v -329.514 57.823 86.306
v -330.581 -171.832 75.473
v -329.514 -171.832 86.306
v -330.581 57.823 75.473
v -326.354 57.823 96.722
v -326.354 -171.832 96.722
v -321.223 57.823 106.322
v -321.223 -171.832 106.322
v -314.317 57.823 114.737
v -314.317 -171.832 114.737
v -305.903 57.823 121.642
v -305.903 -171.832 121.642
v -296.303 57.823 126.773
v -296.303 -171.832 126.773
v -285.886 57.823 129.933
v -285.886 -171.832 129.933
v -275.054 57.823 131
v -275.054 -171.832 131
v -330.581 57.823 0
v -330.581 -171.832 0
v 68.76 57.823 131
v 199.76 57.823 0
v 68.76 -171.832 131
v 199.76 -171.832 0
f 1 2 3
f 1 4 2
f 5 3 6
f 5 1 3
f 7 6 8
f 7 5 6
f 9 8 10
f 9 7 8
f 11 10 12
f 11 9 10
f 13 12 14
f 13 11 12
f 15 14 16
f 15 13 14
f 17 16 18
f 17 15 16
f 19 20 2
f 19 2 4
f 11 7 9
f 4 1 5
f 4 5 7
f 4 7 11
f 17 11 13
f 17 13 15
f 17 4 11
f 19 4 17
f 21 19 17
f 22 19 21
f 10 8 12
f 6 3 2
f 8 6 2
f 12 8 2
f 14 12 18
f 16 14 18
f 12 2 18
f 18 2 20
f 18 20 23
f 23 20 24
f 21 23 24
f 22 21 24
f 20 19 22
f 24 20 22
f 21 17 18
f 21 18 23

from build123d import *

# Parameters (mm, degrees)
F0_W        = 599.3404984474
F0_H        = 229.6551764011
F1_DEPTH    = 131
F2_R        = 55.5269119346
F3_T1_DEPTH = 1258.3283715875


# Not quite as in the source:
# - a fillet or chamfer that OpenCascade refuses, or shapes differently, is made with other operations: its cross-section is extruded or revolved along the edge and cut away or added


with BuildPart() as f1:
    # F0 (on Top) → F1 (new body)
    with BuildSketch(Plane.XY):
        with Locations((-30.9103131294, -57.0044666529)):
            Rectangle(F0_W, F0_H)
    extrude(amount=F1_DEPTH)

    # F2
    f2_edges = [f1.edges().sort_by_distance(p)[0] for p in [
        (-330.580562, -57.004467, 131),
    ]]
    fillet(f2_edges, radius=F2_R)

    # F3: chamfer of 200 on 1 edges, made by hand

    # F3_s2 → F3_t1 (cut)
    with BuildSketch(Plane.XZ.offset(-572.1597191409)):
        Polygon((68.7599360943, 131), (268.7599360943, -69), (268.7599360943, 131), align=None)
    extrude(amount=F3_T1_DEPTH, mode=Mode.SUBTRACT)


solid = f1.part
